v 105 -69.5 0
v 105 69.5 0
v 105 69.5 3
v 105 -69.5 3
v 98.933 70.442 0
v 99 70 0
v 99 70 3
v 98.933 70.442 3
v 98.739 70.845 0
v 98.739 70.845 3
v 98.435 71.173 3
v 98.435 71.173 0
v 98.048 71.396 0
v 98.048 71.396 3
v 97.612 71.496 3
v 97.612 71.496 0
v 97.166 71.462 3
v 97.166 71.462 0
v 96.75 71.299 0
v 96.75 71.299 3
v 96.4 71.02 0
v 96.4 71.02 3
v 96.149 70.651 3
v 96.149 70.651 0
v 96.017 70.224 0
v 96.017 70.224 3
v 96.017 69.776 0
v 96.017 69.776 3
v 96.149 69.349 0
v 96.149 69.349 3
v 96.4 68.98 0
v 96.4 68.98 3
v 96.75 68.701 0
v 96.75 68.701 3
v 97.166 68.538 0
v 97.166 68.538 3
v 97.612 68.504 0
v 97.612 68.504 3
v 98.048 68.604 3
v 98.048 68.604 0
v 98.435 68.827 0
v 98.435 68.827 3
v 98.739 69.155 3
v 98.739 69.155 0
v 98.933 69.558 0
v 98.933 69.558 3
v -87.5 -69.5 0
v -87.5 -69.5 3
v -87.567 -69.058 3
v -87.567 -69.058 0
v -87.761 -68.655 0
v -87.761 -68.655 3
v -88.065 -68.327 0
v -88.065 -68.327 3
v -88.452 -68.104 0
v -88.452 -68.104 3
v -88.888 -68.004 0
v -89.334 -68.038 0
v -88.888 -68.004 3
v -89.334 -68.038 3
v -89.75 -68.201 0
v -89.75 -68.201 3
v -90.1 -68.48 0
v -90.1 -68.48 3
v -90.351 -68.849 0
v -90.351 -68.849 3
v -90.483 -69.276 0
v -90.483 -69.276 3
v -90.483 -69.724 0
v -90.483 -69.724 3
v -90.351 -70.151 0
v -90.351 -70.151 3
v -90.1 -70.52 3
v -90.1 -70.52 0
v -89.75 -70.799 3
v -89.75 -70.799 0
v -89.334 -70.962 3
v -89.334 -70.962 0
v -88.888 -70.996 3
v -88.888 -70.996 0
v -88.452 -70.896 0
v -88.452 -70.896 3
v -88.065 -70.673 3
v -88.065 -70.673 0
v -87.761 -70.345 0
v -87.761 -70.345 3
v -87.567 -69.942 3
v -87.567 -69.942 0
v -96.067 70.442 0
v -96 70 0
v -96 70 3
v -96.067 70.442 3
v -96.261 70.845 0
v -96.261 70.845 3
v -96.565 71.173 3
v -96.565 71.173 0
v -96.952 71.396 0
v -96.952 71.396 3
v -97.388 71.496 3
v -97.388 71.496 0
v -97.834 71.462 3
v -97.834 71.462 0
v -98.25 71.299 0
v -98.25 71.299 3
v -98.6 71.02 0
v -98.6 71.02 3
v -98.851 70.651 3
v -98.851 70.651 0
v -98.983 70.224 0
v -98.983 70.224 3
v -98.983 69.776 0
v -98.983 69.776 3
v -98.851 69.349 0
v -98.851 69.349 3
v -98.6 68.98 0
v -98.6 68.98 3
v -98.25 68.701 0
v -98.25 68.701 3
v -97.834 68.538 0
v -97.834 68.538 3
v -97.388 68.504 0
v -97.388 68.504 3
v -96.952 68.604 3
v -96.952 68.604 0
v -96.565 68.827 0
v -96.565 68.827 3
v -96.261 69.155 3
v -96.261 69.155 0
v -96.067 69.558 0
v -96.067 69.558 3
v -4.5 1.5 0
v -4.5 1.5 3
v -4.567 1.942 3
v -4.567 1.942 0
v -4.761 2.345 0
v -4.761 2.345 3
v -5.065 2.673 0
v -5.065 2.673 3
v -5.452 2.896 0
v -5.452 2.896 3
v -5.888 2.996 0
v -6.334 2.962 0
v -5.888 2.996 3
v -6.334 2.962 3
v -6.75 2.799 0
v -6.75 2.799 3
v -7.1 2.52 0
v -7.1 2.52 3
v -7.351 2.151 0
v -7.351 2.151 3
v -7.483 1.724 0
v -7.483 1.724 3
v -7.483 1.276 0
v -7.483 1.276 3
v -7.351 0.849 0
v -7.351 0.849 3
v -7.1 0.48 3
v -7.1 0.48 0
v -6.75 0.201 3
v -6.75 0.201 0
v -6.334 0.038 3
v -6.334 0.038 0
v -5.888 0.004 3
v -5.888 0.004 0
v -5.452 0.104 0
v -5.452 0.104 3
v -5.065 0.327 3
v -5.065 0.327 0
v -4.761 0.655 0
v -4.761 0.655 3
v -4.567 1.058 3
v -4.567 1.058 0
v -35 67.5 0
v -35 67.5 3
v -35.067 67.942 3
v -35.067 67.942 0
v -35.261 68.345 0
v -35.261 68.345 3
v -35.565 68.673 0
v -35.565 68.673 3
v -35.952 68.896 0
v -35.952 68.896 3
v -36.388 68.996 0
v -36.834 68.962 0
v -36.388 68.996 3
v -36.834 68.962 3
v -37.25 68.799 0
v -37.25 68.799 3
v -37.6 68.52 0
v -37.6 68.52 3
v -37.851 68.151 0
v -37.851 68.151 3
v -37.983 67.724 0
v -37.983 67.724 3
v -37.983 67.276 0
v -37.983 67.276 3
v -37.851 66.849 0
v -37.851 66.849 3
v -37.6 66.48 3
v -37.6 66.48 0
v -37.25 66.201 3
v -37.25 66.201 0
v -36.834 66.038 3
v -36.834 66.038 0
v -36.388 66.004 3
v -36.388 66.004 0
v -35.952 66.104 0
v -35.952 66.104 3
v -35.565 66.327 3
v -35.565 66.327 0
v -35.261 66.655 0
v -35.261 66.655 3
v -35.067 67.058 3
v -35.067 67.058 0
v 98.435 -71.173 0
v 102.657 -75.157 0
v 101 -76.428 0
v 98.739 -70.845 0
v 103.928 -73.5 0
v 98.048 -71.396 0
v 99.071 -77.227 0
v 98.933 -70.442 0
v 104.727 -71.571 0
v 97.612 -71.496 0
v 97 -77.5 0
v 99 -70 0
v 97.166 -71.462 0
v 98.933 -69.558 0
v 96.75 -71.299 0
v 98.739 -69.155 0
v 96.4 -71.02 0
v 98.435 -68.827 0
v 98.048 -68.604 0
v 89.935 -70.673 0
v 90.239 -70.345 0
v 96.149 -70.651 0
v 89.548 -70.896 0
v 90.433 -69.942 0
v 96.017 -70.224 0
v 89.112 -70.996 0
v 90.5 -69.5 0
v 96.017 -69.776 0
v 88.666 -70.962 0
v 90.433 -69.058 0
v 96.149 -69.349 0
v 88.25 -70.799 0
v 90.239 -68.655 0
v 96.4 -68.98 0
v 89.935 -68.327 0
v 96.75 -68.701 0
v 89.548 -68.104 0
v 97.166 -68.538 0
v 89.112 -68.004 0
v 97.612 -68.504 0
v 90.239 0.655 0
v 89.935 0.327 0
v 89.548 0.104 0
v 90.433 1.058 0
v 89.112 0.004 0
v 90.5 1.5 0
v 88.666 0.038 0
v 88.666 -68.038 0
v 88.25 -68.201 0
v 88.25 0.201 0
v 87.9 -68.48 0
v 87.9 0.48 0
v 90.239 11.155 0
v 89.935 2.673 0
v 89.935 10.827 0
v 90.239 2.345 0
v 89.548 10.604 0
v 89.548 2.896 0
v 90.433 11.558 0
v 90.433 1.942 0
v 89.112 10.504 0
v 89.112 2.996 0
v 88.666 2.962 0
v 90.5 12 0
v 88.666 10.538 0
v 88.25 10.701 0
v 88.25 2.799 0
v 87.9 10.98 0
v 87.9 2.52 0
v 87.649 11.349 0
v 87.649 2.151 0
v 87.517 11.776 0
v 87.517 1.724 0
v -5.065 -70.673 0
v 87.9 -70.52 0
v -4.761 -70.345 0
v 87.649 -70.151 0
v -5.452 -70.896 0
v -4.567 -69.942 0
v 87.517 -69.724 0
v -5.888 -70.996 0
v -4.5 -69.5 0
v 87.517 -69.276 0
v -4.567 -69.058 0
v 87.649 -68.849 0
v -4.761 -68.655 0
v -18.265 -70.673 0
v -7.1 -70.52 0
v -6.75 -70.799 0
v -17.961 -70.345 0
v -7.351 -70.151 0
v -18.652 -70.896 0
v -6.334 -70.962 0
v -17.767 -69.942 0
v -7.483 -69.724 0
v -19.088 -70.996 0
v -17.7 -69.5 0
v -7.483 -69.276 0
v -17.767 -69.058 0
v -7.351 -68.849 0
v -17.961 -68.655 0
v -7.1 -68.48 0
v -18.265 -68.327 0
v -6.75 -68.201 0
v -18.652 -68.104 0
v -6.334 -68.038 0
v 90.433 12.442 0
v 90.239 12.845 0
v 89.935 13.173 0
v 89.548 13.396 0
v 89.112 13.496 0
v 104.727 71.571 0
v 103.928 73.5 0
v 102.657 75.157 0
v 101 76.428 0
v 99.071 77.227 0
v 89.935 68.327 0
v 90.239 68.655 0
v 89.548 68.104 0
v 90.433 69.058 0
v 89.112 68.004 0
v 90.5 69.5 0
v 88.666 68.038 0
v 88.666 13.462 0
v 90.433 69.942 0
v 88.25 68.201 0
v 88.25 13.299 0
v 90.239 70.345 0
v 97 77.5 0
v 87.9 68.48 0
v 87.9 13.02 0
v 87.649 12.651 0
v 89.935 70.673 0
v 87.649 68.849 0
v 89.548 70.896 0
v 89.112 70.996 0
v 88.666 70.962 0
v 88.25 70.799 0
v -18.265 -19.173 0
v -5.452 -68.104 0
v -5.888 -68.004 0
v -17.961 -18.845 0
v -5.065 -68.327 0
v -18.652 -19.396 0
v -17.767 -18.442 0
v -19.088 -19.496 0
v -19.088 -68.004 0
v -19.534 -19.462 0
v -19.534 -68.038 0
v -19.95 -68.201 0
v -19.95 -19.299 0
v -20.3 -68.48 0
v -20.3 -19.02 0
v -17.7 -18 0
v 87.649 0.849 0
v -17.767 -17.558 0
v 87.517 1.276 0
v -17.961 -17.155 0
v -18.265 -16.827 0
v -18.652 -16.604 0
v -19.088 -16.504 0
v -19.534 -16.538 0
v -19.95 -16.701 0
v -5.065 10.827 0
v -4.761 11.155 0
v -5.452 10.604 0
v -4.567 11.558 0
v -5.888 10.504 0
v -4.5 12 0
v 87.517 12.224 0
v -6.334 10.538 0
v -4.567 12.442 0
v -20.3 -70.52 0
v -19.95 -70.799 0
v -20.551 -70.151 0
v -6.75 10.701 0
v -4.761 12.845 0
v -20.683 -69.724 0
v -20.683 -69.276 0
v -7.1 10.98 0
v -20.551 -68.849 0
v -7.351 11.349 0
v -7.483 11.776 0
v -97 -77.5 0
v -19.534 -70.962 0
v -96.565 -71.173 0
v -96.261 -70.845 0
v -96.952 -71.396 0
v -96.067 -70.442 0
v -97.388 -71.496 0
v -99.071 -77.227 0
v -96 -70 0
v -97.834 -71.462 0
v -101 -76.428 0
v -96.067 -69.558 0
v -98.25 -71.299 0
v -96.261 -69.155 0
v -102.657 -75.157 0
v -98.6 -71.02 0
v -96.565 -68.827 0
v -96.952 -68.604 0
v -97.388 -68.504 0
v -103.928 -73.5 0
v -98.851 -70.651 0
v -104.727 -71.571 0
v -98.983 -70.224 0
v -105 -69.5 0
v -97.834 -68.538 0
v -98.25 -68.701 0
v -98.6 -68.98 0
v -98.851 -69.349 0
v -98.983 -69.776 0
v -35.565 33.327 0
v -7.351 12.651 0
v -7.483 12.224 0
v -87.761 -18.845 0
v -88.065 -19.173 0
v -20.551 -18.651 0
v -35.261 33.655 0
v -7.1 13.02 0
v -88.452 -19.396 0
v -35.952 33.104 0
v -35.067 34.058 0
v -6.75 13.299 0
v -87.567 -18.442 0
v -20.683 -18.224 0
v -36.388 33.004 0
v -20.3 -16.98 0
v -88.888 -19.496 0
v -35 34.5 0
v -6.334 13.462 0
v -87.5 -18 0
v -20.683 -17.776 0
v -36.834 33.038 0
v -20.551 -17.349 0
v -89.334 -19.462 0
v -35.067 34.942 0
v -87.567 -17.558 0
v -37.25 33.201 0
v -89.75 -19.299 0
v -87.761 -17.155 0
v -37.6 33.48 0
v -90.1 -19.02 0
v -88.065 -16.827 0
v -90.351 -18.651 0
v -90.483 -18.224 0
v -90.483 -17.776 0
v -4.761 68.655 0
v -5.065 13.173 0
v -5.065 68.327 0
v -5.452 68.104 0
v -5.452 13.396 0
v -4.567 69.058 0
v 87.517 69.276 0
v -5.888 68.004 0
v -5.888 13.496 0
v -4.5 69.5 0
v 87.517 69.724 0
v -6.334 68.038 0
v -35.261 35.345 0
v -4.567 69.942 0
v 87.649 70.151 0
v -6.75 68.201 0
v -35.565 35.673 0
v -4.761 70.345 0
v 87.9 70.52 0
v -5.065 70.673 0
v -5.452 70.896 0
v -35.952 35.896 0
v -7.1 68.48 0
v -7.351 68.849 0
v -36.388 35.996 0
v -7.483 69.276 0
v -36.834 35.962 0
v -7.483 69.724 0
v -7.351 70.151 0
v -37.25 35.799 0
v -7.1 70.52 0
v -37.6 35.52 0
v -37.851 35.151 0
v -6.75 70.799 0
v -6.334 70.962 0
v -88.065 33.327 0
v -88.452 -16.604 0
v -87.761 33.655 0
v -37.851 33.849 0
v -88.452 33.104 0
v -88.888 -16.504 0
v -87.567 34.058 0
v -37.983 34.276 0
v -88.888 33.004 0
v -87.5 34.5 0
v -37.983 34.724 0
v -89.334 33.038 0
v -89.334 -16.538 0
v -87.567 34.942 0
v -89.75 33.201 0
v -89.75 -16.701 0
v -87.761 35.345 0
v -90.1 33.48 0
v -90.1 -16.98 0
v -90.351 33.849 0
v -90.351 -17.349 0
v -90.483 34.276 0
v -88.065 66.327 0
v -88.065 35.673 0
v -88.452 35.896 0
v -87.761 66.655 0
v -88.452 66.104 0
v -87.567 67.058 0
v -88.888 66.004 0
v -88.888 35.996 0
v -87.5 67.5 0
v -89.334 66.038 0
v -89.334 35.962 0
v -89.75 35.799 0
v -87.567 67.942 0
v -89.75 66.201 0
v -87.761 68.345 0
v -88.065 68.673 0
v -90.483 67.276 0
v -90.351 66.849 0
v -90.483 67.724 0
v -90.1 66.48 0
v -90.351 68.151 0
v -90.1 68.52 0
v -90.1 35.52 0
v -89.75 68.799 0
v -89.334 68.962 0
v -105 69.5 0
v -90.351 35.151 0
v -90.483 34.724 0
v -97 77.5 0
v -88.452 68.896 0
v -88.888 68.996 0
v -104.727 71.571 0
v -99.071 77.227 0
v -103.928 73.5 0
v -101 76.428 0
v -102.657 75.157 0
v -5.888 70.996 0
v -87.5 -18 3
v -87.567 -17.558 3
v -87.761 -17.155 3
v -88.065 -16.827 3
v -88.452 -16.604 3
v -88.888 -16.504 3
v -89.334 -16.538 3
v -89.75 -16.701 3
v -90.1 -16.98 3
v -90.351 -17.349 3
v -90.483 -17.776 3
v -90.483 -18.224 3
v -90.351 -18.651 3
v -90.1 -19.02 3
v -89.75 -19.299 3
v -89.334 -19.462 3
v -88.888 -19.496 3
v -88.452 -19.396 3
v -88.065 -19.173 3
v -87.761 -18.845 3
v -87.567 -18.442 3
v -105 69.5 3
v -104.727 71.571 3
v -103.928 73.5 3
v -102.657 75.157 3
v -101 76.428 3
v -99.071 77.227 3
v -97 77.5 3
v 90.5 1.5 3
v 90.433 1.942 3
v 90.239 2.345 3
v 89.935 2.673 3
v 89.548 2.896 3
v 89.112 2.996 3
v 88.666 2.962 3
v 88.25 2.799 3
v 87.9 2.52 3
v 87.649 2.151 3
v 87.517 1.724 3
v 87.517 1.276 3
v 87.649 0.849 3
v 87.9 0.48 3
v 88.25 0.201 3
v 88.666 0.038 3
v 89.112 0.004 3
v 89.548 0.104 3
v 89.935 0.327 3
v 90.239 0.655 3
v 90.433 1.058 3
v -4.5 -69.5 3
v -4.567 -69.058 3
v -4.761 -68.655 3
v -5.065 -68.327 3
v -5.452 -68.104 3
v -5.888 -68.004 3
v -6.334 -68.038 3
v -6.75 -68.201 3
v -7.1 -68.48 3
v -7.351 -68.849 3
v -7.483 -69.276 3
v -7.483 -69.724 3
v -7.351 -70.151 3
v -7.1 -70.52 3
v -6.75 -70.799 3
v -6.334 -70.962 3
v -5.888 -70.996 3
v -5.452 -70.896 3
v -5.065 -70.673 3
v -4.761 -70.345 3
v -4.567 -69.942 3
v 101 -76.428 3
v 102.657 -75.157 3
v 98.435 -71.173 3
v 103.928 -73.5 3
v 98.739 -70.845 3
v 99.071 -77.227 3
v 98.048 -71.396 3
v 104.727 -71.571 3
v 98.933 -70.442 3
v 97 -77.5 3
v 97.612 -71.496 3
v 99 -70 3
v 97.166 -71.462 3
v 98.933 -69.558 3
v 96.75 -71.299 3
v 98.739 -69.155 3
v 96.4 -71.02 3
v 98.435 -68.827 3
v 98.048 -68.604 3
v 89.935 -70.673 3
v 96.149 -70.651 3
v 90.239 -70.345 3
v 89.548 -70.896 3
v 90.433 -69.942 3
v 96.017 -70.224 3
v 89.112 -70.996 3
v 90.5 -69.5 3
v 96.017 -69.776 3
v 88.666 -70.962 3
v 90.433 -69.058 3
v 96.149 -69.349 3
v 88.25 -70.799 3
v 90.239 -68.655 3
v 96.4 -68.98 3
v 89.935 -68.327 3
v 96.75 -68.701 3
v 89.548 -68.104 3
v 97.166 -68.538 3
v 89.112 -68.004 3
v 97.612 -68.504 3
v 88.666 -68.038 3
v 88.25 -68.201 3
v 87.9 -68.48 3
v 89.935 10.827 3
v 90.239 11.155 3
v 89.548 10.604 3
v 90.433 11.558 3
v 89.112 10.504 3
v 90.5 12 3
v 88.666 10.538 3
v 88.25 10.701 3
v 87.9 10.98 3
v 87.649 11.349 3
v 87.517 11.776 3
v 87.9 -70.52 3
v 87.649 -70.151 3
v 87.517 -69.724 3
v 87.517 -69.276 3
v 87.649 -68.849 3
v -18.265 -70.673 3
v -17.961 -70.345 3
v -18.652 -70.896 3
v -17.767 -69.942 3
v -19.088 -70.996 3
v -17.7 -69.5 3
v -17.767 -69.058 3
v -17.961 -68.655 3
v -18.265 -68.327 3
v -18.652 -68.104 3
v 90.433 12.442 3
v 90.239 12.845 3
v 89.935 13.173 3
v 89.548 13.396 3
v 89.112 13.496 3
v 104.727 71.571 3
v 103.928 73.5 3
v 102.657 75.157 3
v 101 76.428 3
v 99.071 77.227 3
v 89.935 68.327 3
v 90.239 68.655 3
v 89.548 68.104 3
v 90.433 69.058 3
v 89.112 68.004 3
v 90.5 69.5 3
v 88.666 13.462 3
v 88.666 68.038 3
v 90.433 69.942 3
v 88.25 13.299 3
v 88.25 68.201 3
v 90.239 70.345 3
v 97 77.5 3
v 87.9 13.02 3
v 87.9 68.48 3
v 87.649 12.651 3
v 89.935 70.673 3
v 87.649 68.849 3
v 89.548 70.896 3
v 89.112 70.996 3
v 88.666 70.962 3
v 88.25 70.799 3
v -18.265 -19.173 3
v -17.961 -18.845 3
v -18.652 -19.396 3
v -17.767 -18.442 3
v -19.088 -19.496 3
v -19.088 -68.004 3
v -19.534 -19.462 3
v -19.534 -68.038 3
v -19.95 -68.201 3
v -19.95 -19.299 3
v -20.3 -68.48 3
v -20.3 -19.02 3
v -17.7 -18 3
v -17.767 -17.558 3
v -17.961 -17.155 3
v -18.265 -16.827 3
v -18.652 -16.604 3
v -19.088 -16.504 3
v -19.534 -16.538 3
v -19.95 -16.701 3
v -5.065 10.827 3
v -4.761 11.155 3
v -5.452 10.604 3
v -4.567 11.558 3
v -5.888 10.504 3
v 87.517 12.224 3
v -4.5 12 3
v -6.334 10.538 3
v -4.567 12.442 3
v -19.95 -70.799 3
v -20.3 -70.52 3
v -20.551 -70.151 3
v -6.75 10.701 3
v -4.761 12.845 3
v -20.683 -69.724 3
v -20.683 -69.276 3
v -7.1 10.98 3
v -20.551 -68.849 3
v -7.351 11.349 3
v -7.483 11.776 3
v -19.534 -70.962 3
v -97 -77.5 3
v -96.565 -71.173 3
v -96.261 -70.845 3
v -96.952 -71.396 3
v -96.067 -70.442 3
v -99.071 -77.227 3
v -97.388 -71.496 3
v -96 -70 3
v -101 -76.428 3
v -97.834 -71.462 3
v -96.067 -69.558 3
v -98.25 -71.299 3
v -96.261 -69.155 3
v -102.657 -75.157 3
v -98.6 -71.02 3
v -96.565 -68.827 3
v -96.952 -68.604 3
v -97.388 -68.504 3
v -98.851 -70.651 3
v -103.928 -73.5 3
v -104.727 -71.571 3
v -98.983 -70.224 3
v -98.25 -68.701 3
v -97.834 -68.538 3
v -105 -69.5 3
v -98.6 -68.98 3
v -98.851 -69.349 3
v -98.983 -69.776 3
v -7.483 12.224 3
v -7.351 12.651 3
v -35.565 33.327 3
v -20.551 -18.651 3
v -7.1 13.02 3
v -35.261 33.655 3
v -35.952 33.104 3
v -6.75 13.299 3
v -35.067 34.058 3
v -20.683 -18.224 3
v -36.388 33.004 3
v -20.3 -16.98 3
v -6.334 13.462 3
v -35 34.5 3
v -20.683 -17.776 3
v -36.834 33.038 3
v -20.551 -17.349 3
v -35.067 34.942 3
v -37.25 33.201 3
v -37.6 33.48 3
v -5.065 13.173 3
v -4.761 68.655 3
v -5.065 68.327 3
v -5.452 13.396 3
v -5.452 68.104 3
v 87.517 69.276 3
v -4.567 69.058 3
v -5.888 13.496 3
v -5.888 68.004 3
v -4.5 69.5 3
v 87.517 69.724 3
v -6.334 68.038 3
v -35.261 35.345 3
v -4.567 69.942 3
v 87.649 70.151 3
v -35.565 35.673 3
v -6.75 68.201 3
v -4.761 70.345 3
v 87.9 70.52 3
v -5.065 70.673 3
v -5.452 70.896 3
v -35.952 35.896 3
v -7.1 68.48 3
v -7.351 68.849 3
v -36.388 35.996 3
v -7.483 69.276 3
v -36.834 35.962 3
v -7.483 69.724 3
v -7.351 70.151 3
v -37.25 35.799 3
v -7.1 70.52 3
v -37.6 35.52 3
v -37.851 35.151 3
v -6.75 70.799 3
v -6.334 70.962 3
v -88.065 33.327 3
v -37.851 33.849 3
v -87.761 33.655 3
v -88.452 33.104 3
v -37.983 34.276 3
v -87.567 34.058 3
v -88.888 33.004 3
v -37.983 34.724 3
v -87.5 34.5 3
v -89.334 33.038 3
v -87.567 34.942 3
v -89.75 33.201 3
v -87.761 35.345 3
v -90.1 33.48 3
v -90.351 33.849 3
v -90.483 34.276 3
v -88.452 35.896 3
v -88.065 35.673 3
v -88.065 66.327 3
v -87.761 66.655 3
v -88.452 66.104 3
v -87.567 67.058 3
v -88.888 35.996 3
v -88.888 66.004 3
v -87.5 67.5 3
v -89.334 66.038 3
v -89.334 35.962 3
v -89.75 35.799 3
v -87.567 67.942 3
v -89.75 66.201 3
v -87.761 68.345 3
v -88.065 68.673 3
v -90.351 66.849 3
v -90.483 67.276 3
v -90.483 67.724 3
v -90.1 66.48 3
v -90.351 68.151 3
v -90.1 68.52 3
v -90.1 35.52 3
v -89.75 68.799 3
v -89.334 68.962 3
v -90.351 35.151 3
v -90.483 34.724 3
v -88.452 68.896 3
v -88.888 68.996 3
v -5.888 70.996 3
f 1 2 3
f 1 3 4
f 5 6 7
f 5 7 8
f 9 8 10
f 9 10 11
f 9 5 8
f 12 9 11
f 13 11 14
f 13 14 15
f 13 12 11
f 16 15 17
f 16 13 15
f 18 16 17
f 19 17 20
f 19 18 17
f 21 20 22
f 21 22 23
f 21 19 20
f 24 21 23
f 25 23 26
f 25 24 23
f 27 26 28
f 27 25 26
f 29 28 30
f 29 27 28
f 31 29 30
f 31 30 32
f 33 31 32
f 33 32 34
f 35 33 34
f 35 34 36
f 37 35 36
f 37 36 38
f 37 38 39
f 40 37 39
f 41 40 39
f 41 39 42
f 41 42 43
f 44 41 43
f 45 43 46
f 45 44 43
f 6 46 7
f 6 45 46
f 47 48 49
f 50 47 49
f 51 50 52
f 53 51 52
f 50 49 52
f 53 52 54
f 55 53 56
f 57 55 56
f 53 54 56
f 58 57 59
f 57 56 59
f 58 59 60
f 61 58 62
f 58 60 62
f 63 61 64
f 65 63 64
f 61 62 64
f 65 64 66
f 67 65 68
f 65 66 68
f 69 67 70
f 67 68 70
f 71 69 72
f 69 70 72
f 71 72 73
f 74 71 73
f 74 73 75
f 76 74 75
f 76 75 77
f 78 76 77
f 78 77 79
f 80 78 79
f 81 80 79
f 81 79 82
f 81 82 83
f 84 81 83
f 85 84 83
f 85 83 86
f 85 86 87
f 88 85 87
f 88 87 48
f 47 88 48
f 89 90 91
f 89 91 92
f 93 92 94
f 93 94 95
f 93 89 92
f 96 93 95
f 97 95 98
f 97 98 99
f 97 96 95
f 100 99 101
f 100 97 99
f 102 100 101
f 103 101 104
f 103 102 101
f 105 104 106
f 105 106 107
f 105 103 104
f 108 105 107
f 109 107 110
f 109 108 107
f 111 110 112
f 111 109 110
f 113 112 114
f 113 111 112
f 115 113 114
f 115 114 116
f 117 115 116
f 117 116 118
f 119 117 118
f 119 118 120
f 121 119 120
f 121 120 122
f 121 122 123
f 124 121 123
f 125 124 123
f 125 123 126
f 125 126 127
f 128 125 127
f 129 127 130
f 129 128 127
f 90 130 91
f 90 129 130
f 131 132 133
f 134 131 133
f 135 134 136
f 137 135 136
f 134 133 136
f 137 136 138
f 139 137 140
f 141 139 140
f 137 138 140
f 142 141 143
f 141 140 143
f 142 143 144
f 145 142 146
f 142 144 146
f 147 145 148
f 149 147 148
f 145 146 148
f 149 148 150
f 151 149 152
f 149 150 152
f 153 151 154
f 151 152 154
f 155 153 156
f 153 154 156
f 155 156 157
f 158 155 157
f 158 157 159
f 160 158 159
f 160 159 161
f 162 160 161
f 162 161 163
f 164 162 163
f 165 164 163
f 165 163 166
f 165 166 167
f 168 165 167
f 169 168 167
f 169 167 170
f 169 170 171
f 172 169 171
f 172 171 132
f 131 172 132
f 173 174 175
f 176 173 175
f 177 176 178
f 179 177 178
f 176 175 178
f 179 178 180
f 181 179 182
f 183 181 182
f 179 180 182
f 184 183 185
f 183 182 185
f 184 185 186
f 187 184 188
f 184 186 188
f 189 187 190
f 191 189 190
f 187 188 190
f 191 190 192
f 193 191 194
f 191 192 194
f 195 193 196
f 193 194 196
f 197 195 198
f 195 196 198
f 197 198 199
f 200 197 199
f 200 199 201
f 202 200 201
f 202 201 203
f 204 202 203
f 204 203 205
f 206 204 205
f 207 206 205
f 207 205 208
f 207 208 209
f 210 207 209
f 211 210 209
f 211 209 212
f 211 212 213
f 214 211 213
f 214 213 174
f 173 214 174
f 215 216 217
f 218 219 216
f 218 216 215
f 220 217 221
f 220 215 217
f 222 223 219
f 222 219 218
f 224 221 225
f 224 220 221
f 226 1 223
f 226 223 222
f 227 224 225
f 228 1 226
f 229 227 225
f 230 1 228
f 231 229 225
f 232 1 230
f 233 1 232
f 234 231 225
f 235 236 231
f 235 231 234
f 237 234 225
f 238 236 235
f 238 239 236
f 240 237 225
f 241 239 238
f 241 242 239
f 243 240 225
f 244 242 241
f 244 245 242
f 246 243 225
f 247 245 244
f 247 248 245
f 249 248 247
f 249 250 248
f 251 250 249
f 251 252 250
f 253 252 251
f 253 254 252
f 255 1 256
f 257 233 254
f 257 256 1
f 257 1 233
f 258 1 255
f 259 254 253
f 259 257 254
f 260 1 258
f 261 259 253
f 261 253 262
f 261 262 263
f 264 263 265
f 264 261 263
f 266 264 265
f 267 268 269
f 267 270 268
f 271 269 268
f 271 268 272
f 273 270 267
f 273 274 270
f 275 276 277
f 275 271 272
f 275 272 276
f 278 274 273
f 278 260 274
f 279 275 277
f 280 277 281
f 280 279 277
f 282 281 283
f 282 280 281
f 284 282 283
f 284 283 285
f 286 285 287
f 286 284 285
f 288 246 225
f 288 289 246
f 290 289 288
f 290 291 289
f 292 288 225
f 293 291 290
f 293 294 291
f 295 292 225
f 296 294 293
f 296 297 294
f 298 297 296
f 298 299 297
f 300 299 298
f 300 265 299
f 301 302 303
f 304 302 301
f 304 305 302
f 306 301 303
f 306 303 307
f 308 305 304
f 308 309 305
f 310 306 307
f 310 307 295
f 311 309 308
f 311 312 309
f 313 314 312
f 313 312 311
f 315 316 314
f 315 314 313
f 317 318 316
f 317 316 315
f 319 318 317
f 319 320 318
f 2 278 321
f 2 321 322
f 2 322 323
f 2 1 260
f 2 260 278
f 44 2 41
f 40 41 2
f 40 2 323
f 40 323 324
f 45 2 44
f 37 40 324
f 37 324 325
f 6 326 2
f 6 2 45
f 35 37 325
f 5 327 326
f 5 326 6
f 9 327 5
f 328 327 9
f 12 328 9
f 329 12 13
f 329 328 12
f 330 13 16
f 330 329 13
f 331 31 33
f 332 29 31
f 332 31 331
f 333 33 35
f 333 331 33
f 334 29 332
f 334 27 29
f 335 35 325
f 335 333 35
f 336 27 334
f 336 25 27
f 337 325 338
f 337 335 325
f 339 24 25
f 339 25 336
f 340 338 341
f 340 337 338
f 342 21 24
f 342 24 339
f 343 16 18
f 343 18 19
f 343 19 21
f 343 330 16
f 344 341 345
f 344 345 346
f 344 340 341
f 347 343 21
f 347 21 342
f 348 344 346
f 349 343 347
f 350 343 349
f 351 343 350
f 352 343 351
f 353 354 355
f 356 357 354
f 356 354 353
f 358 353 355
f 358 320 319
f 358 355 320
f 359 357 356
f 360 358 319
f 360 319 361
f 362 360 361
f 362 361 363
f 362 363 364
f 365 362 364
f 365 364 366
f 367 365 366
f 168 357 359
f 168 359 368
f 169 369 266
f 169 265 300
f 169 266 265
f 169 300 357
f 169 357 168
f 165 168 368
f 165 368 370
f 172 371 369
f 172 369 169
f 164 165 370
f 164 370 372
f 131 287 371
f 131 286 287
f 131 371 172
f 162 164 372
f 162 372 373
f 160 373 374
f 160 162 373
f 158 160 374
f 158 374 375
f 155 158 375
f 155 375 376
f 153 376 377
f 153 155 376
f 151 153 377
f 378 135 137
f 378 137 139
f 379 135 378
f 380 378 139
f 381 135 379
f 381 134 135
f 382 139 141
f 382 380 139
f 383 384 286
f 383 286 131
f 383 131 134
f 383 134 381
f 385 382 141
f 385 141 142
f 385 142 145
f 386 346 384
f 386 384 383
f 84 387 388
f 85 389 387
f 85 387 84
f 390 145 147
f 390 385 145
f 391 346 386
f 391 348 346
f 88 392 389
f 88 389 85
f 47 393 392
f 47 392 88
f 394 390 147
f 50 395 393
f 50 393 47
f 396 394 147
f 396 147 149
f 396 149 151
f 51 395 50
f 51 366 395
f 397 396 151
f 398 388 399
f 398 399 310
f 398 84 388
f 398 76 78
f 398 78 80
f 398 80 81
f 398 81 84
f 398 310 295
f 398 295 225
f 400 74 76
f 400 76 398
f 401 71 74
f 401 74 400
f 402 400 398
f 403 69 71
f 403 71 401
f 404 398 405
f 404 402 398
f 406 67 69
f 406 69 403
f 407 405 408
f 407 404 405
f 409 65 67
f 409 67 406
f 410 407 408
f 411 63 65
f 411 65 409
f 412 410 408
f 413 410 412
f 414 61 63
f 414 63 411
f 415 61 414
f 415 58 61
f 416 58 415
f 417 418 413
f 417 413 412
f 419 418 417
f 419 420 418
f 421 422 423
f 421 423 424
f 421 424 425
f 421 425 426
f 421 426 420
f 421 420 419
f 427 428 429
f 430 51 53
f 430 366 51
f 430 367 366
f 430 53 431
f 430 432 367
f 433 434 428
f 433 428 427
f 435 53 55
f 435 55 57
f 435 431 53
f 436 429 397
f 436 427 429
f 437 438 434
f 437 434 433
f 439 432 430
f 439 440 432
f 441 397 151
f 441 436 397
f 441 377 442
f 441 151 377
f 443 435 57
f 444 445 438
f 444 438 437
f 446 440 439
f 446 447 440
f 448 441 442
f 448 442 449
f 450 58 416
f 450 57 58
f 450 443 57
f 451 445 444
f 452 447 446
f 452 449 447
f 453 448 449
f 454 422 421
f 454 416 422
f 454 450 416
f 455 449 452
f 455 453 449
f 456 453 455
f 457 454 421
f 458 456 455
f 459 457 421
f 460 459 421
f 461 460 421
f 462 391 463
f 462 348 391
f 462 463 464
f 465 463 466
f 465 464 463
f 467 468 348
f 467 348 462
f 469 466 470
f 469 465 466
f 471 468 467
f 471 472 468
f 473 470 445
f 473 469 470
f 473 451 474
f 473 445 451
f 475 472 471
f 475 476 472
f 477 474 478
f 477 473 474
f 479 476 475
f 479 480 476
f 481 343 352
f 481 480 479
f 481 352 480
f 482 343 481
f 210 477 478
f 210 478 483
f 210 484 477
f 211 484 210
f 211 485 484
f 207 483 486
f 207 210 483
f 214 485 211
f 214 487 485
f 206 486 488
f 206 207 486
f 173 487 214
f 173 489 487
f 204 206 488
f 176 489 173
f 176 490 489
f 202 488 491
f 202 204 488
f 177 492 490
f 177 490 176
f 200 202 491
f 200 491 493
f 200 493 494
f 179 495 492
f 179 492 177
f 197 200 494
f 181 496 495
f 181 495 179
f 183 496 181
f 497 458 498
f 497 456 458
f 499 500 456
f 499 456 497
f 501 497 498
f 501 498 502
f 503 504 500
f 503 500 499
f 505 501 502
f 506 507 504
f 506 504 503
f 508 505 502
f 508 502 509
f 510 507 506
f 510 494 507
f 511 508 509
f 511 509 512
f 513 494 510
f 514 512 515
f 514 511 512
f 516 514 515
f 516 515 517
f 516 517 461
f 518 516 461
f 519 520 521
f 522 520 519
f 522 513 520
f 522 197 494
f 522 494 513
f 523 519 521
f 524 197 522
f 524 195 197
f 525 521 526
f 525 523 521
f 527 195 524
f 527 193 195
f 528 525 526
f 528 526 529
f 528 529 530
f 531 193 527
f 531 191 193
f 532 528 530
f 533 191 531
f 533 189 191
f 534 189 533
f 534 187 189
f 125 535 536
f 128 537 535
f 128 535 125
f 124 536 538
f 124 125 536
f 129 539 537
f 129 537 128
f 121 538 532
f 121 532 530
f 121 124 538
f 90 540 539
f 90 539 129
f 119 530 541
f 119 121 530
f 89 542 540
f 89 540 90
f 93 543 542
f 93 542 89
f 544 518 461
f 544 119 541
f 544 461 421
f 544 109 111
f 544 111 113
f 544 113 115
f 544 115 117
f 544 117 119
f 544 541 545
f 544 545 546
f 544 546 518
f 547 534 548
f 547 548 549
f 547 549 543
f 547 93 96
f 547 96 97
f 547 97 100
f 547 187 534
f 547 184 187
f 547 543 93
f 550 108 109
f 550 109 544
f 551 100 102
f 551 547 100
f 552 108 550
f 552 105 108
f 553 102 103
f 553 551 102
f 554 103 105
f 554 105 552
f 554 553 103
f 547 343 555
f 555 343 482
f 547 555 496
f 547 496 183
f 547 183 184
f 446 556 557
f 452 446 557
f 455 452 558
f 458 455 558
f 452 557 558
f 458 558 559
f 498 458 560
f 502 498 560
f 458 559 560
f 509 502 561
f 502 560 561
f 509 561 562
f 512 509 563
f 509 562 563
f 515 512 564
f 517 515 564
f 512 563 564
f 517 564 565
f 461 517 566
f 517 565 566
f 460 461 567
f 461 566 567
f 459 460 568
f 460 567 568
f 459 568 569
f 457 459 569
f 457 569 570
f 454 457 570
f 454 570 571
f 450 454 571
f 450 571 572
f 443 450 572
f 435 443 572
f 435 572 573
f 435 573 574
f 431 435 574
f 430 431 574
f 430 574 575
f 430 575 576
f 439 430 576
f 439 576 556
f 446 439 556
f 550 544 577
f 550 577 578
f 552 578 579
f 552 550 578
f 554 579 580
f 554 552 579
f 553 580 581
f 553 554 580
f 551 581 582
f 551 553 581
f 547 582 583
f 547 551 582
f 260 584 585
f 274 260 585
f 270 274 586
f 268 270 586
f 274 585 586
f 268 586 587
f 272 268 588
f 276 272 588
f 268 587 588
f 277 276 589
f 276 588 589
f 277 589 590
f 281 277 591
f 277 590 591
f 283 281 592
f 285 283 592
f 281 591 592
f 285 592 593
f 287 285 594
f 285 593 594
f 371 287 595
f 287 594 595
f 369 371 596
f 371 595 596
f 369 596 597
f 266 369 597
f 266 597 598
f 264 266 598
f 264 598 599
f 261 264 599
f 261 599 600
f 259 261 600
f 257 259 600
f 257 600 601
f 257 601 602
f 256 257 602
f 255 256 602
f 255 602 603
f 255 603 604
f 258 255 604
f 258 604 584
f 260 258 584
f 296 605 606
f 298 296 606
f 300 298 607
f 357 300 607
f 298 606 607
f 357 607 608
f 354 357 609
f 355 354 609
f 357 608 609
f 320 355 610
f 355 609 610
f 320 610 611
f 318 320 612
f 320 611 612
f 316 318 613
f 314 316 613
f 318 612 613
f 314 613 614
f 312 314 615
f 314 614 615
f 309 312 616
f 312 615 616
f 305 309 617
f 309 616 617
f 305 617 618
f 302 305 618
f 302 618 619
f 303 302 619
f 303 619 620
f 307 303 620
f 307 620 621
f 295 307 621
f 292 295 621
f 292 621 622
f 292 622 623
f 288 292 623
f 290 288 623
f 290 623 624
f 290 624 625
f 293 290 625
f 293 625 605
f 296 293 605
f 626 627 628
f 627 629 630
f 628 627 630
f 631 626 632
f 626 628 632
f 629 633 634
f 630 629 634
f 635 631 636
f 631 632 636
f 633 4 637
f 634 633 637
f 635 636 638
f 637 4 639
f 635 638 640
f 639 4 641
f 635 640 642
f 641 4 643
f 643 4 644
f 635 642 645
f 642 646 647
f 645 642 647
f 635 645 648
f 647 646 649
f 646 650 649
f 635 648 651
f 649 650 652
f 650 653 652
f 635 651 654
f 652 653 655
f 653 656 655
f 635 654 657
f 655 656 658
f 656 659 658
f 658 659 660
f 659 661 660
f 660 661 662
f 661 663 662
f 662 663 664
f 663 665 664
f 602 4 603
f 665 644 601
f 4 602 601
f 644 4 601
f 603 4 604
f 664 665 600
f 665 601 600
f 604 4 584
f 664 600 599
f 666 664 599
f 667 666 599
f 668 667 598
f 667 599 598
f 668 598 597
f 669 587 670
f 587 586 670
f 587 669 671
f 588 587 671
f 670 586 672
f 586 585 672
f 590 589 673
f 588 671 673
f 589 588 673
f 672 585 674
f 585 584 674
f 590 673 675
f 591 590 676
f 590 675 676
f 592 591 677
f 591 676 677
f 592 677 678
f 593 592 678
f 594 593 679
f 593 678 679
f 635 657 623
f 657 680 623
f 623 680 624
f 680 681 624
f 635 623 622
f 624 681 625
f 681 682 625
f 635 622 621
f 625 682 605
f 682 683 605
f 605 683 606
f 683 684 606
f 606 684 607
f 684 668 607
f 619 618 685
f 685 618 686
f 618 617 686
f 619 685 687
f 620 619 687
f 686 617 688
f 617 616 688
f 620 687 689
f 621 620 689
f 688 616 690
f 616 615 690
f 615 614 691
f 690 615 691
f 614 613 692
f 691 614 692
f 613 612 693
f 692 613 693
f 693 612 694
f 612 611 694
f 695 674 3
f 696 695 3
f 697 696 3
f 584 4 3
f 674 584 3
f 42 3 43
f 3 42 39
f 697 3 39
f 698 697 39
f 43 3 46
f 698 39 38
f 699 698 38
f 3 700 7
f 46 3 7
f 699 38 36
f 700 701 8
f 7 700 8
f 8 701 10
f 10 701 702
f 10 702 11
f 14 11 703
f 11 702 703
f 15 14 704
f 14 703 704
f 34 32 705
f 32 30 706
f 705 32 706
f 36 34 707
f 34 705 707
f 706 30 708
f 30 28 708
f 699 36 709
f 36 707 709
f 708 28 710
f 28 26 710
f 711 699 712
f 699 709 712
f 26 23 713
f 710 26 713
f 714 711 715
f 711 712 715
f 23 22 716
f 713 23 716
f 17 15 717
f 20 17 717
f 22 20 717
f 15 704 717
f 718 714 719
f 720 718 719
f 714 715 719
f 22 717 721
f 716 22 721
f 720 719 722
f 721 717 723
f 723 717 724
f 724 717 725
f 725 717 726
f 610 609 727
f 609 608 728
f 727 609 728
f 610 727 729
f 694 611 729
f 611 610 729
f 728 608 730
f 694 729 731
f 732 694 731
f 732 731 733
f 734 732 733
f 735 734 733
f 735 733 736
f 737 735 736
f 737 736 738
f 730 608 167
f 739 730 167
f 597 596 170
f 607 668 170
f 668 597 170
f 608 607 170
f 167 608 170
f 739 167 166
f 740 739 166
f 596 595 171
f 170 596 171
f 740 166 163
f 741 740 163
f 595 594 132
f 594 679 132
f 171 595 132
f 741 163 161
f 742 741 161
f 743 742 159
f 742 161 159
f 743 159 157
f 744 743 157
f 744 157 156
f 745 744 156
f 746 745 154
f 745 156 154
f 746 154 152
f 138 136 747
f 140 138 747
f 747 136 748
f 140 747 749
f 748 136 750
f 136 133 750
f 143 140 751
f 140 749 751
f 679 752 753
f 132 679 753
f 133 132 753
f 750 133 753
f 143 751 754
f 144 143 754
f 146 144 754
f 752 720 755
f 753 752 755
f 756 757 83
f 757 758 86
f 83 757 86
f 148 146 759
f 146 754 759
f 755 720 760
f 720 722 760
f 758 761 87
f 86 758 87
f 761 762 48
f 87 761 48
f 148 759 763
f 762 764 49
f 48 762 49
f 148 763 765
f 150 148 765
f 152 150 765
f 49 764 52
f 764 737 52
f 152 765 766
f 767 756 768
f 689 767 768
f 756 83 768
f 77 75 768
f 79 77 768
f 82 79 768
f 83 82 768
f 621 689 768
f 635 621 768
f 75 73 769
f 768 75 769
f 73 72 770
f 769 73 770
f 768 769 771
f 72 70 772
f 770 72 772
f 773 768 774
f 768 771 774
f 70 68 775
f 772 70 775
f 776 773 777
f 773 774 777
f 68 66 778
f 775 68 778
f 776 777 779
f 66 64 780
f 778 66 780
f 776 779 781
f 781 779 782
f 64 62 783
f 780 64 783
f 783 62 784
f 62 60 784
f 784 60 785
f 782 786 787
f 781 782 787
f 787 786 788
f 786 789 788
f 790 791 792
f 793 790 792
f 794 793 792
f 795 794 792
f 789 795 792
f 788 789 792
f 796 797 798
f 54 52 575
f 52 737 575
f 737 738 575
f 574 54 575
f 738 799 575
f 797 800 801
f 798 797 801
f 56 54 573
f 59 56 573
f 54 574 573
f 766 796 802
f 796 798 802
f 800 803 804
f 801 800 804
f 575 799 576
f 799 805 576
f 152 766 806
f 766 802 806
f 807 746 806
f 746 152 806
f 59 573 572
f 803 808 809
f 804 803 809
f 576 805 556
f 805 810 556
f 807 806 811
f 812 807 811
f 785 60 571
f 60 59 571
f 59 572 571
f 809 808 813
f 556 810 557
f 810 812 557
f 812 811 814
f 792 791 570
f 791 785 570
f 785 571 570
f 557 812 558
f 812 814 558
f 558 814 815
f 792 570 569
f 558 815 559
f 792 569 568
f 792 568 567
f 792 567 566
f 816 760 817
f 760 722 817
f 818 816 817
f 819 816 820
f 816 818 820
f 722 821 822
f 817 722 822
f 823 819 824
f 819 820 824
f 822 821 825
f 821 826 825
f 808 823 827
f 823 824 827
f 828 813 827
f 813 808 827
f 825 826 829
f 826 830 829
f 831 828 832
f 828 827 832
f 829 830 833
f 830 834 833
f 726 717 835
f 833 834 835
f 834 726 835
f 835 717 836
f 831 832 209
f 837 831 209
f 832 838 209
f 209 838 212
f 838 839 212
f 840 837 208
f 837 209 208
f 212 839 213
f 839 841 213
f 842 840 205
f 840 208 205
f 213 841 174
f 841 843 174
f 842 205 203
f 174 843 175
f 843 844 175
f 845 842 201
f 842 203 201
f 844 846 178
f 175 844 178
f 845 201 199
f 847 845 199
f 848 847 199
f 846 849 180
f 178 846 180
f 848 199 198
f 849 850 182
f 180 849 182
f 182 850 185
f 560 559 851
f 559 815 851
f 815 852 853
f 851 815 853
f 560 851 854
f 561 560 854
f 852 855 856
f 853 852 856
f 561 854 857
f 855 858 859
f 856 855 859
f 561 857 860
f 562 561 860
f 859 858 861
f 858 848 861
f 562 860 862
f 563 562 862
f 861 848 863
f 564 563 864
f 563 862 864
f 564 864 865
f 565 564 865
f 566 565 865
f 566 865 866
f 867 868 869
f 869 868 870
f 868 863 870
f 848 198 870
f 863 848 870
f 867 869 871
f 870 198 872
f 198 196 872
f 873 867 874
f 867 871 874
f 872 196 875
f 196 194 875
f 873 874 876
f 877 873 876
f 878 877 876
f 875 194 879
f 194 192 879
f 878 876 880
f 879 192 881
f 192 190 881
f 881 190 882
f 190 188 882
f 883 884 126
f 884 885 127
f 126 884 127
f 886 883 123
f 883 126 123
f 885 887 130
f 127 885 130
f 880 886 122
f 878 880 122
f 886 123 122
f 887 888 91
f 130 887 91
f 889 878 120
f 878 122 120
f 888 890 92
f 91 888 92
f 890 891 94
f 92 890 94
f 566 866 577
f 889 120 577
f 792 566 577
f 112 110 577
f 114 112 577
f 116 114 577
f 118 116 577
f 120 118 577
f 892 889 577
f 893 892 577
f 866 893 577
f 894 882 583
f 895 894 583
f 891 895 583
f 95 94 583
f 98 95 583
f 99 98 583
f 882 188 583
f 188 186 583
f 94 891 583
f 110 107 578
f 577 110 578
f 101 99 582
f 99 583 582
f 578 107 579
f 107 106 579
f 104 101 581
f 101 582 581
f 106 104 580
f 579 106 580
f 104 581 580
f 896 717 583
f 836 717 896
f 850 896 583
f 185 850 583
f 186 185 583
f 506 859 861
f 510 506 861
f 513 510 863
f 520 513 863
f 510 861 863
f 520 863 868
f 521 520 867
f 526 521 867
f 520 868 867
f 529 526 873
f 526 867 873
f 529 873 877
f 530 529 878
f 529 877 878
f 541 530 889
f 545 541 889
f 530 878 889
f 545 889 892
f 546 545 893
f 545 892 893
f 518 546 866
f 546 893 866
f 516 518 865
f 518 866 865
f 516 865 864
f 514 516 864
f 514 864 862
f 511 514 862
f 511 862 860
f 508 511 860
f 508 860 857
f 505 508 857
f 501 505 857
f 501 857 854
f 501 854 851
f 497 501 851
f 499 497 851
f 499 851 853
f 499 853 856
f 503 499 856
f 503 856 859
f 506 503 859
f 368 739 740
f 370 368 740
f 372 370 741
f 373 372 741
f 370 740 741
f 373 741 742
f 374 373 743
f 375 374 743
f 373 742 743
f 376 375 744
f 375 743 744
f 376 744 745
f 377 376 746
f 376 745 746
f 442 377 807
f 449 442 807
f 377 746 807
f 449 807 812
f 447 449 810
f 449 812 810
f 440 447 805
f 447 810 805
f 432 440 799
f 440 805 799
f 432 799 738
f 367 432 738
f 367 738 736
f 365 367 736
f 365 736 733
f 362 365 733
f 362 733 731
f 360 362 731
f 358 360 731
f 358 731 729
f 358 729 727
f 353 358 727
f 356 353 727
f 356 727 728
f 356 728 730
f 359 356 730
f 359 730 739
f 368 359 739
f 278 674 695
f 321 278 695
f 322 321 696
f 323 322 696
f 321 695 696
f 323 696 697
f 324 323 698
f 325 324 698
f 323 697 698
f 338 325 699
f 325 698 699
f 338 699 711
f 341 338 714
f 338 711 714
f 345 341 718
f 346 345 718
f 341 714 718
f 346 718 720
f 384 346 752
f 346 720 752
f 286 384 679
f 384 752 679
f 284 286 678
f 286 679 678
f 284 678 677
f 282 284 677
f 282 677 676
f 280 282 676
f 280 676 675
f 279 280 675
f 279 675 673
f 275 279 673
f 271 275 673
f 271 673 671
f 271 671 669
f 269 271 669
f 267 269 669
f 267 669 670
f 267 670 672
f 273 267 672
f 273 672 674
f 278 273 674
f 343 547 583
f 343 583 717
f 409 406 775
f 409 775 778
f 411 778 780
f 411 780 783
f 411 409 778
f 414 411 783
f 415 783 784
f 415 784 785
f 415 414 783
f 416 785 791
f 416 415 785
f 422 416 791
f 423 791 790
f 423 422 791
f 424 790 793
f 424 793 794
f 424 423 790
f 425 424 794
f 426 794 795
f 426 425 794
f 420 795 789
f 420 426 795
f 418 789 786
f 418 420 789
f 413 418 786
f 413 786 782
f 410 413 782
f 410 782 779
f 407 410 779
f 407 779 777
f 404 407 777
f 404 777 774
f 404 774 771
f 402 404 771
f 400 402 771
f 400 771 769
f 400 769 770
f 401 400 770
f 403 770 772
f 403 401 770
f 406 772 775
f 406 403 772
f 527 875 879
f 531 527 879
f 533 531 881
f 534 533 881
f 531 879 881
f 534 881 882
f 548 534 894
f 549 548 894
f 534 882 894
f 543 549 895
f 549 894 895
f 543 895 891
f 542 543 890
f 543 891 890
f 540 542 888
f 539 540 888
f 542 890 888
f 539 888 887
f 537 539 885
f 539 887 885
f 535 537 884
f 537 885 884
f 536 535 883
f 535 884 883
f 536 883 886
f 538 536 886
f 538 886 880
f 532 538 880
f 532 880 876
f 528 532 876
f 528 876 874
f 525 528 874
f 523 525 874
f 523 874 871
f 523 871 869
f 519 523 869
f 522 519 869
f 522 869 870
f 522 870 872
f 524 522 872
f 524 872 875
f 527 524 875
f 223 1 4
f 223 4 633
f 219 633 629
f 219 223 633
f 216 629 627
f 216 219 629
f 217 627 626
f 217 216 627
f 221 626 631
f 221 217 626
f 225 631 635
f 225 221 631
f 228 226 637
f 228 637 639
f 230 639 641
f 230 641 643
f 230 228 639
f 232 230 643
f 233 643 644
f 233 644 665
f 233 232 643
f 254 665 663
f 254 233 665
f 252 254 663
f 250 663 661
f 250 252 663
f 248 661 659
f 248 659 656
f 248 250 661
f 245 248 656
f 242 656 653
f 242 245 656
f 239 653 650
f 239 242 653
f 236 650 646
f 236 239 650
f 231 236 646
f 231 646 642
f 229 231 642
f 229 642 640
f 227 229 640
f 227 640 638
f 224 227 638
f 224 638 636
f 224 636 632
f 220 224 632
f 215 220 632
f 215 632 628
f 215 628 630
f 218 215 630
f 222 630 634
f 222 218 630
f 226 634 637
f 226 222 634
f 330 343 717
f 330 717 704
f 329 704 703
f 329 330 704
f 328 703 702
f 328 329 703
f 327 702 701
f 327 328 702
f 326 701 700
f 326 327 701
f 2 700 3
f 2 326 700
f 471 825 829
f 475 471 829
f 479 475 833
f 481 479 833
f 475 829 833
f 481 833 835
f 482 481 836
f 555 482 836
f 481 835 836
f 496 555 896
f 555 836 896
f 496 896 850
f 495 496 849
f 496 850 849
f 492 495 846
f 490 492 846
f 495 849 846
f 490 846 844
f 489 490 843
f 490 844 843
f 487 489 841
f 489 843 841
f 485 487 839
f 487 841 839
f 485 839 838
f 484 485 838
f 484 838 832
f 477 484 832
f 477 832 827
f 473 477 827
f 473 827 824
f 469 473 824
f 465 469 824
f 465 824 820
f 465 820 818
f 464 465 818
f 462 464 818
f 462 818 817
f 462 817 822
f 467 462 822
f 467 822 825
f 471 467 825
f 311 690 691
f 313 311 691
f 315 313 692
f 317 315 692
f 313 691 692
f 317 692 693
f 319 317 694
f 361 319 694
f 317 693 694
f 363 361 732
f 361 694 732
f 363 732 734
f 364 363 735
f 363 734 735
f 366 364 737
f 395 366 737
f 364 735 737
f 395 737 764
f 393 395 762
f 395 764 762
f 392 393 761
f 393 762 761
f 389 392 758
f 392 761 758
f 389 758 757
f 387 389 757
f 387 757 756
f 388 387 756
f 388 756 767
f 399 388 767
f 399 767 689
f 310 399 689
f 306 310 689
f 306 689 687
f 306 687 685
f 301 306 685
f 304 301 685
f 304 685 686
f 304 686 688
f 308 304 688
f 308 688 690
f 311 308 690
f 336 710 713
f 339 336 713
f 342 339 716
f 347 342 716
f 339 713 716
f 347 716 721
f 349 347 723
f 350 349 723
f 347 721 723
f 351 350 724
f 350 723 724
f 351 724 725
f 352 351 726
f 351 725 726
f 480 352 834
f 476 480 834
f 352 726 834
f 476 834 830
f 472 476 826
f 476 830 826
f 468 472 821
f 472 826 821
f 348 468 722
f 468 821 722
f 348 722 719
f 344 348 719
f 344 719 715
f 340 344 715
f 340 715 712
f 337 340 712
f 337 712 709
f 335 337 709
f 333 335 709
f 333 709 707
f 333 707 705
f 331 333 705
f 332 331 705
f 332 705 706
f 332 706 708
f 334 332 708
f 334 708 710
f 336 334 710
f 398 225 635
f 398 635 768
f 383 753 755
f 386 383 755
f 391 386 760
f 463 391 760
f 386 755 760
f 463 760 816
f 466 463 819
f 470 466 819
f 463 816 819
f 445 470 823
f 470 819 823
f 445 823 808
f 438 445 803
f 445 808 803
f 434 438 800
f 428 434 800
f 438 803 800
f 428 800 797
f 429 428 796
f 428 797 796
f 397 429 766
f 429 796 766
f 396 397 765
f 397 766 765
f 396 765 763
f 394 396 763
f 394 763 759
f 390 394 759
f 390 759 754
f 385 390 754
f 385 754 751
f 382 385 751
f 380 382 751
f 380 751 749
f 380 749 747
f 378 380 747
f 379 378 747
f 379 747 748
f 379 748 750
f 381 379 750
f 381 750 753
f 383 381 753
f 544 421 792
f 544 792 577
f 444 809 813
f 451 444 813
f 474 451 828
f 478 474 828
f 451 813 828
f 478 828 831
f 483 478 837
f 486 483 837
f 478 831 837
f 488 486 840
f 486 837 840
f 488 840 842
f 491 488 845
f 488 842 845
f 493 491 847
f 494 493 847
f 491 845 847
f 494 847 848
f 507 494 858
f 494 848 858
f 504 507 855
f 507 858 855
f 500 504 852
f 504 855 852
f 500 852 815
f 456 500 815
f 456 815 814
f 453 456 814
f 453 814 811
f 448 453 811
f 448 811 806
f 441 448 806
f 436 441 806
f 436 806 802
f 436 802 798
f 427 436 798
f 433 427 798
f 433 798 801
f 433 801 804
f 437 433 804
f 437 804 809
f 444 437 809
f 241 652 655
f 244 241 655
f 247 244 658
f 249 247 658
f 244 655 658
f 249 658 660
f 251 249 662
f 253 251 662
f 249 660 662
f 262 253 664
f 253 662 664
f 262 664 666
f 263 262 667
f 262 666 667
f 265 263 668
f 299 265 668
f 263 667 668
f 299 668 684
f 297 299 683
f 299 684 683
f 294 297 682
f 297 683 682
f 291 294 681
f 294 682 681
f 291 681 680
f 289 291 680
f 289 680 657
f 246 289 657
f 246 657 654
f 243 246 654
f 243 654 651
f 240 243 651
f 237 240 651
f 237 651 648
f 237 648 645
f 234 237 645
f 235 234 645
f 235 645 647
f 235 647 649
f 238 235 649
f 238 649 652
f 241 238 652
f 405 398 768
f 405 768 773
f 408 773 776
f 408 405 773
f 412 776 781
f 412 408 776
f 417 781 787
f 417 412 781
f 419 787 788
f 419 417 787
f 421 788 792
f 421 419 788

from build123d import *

# Parameters (mm, degrees)
SKETCH1_R           = 1.5
BOSS_EXTRUDE1_DEPTH = 3
SKETCH2_R           = 1.5
LVPCB_HOLE_DEPTH    = 20
SKETCH4_R           = 1.5
SDC_HOLE_DEPTH      = 10
SKETCH3_R           = 1.5
TSAL_LV_HOLE_DEPTH  = 10
SKETCH5_R           = 1.5
BSPD_HOLE_DEPTH     = 10


with BuildPart() as part:
    # Sketch1 → Boss-Extrude1 (new body)
    with BuildSketch(Plane.XY):
        with BuildLine():
            Line((-97, 77.5), (97, 77.5))
            ThreePointArc((97, 77.5), (102.656854249, 75.156854249), (105, 69.5))
            Line((105, 69.5), (105, -69.5))
            ThreePointArc((105, -69.5), (102.656854249, -75.156854249), (97, -77.5))
            Line((97, -77.5), (-97, -77.5))
            ThreePointArc((-97, -77.5), (-102.656854249, -75.156854249), (-105, -69.5))
            Line((-105, -69.5), (-105, 69.5))
            ThreePointArc((-105, 69.5), (-102.656854249, 75.156854249), (-97, 77.5))
        make_face()
        with Locations((-97.5, 70)):
            Circle(SKETCH1_R, mode=Mode.SUBTRACT)
        with Locations((97.5, 70)):
            Circle(SKETCH1_R, mode=Mode.SUBTRACT)
        with Locations((-97.5, -70)):
            Circle(SKETCH1_R, mode=Mode.SUBTRACT)
        with Locations((97.5, -70)):
            Circle(SKETCH1_R, mode=Mode.SUBTRACT)
    extrude(amount=BOSS_EXTRUDE1_DEPTH)

    # Sketch2 → LVPCB Hole (cut)
    with BuildSketch(Plane.XY.offset(3)):
        with Locations((-6, 69.5)):
            Circle(SKETCH2_R)
        with Locations((89, 69.5)):
            Circle(SKETCH2_R)
        with Locations((-6, 12)):
            Circle(SKETCH2_R)
        with Locations((89, 12)):
            Circle(SKETCH2_R)
    extrude(amount=-LVPCB_HOLE_DEPTH, mode=Mode.SUBTRACT)

    # Sketch4 → SDC Hole (cut)
    with BuildSketch(Plane.XY.offset(3)):
        with Locations((-6, 1.5)):
            Circle(SKETCH4_R)
        with Locations((89, 1.5)):
            Circle(SKETCH4_R)
        with Locations((-6, -69.5)):
            Circle(SKETCH4_R)
        with Locations((89, -69.5)):
            Circle(SKETCH4_R)
    extrude(amount=-SDC_HOLE_DEPTH, mode=Mode.SUBTRACT)

    # Sketch3 → TSAL LV Hole (cut)
    with BuildSketch(Plane.XY.offset(3)):
        with Locations((-89, -18)):
            Circle(SKETCH3_R)
        with Locations((-19.2, -18)):
            Circle(SKETCH3_R)
        with Locations((-89, -69.5)):
            Circle(SKETCH3_R)
        with Locations((-19.2, -69.5)):
            Circle(SKETCH3_R)
    extrude(amount=-TSAL_LV_HOLE_DEPTH, mode=Mode.SUBTRACT)

    # Sketch5 → BSPD Hole (cut)
    with BuildSketch(Plane.XY.offset(3)):
        with Locations((-89, 67.5)):
            Circle(SKETCH5_R)
        with Locations((-36.5, 67.5)):
            Circle(SKETCH5_R)
        with Locations((-89, 34.5)):
            Circle(SKETCH5_R)
        with Locations((-36.5, 34.5)):
            Circle(SKETCH5_R)
    extrude(amount=-BSPD_HOLE_DEPTH, mode=Mode.SUBTRACT)


solid = part.part
